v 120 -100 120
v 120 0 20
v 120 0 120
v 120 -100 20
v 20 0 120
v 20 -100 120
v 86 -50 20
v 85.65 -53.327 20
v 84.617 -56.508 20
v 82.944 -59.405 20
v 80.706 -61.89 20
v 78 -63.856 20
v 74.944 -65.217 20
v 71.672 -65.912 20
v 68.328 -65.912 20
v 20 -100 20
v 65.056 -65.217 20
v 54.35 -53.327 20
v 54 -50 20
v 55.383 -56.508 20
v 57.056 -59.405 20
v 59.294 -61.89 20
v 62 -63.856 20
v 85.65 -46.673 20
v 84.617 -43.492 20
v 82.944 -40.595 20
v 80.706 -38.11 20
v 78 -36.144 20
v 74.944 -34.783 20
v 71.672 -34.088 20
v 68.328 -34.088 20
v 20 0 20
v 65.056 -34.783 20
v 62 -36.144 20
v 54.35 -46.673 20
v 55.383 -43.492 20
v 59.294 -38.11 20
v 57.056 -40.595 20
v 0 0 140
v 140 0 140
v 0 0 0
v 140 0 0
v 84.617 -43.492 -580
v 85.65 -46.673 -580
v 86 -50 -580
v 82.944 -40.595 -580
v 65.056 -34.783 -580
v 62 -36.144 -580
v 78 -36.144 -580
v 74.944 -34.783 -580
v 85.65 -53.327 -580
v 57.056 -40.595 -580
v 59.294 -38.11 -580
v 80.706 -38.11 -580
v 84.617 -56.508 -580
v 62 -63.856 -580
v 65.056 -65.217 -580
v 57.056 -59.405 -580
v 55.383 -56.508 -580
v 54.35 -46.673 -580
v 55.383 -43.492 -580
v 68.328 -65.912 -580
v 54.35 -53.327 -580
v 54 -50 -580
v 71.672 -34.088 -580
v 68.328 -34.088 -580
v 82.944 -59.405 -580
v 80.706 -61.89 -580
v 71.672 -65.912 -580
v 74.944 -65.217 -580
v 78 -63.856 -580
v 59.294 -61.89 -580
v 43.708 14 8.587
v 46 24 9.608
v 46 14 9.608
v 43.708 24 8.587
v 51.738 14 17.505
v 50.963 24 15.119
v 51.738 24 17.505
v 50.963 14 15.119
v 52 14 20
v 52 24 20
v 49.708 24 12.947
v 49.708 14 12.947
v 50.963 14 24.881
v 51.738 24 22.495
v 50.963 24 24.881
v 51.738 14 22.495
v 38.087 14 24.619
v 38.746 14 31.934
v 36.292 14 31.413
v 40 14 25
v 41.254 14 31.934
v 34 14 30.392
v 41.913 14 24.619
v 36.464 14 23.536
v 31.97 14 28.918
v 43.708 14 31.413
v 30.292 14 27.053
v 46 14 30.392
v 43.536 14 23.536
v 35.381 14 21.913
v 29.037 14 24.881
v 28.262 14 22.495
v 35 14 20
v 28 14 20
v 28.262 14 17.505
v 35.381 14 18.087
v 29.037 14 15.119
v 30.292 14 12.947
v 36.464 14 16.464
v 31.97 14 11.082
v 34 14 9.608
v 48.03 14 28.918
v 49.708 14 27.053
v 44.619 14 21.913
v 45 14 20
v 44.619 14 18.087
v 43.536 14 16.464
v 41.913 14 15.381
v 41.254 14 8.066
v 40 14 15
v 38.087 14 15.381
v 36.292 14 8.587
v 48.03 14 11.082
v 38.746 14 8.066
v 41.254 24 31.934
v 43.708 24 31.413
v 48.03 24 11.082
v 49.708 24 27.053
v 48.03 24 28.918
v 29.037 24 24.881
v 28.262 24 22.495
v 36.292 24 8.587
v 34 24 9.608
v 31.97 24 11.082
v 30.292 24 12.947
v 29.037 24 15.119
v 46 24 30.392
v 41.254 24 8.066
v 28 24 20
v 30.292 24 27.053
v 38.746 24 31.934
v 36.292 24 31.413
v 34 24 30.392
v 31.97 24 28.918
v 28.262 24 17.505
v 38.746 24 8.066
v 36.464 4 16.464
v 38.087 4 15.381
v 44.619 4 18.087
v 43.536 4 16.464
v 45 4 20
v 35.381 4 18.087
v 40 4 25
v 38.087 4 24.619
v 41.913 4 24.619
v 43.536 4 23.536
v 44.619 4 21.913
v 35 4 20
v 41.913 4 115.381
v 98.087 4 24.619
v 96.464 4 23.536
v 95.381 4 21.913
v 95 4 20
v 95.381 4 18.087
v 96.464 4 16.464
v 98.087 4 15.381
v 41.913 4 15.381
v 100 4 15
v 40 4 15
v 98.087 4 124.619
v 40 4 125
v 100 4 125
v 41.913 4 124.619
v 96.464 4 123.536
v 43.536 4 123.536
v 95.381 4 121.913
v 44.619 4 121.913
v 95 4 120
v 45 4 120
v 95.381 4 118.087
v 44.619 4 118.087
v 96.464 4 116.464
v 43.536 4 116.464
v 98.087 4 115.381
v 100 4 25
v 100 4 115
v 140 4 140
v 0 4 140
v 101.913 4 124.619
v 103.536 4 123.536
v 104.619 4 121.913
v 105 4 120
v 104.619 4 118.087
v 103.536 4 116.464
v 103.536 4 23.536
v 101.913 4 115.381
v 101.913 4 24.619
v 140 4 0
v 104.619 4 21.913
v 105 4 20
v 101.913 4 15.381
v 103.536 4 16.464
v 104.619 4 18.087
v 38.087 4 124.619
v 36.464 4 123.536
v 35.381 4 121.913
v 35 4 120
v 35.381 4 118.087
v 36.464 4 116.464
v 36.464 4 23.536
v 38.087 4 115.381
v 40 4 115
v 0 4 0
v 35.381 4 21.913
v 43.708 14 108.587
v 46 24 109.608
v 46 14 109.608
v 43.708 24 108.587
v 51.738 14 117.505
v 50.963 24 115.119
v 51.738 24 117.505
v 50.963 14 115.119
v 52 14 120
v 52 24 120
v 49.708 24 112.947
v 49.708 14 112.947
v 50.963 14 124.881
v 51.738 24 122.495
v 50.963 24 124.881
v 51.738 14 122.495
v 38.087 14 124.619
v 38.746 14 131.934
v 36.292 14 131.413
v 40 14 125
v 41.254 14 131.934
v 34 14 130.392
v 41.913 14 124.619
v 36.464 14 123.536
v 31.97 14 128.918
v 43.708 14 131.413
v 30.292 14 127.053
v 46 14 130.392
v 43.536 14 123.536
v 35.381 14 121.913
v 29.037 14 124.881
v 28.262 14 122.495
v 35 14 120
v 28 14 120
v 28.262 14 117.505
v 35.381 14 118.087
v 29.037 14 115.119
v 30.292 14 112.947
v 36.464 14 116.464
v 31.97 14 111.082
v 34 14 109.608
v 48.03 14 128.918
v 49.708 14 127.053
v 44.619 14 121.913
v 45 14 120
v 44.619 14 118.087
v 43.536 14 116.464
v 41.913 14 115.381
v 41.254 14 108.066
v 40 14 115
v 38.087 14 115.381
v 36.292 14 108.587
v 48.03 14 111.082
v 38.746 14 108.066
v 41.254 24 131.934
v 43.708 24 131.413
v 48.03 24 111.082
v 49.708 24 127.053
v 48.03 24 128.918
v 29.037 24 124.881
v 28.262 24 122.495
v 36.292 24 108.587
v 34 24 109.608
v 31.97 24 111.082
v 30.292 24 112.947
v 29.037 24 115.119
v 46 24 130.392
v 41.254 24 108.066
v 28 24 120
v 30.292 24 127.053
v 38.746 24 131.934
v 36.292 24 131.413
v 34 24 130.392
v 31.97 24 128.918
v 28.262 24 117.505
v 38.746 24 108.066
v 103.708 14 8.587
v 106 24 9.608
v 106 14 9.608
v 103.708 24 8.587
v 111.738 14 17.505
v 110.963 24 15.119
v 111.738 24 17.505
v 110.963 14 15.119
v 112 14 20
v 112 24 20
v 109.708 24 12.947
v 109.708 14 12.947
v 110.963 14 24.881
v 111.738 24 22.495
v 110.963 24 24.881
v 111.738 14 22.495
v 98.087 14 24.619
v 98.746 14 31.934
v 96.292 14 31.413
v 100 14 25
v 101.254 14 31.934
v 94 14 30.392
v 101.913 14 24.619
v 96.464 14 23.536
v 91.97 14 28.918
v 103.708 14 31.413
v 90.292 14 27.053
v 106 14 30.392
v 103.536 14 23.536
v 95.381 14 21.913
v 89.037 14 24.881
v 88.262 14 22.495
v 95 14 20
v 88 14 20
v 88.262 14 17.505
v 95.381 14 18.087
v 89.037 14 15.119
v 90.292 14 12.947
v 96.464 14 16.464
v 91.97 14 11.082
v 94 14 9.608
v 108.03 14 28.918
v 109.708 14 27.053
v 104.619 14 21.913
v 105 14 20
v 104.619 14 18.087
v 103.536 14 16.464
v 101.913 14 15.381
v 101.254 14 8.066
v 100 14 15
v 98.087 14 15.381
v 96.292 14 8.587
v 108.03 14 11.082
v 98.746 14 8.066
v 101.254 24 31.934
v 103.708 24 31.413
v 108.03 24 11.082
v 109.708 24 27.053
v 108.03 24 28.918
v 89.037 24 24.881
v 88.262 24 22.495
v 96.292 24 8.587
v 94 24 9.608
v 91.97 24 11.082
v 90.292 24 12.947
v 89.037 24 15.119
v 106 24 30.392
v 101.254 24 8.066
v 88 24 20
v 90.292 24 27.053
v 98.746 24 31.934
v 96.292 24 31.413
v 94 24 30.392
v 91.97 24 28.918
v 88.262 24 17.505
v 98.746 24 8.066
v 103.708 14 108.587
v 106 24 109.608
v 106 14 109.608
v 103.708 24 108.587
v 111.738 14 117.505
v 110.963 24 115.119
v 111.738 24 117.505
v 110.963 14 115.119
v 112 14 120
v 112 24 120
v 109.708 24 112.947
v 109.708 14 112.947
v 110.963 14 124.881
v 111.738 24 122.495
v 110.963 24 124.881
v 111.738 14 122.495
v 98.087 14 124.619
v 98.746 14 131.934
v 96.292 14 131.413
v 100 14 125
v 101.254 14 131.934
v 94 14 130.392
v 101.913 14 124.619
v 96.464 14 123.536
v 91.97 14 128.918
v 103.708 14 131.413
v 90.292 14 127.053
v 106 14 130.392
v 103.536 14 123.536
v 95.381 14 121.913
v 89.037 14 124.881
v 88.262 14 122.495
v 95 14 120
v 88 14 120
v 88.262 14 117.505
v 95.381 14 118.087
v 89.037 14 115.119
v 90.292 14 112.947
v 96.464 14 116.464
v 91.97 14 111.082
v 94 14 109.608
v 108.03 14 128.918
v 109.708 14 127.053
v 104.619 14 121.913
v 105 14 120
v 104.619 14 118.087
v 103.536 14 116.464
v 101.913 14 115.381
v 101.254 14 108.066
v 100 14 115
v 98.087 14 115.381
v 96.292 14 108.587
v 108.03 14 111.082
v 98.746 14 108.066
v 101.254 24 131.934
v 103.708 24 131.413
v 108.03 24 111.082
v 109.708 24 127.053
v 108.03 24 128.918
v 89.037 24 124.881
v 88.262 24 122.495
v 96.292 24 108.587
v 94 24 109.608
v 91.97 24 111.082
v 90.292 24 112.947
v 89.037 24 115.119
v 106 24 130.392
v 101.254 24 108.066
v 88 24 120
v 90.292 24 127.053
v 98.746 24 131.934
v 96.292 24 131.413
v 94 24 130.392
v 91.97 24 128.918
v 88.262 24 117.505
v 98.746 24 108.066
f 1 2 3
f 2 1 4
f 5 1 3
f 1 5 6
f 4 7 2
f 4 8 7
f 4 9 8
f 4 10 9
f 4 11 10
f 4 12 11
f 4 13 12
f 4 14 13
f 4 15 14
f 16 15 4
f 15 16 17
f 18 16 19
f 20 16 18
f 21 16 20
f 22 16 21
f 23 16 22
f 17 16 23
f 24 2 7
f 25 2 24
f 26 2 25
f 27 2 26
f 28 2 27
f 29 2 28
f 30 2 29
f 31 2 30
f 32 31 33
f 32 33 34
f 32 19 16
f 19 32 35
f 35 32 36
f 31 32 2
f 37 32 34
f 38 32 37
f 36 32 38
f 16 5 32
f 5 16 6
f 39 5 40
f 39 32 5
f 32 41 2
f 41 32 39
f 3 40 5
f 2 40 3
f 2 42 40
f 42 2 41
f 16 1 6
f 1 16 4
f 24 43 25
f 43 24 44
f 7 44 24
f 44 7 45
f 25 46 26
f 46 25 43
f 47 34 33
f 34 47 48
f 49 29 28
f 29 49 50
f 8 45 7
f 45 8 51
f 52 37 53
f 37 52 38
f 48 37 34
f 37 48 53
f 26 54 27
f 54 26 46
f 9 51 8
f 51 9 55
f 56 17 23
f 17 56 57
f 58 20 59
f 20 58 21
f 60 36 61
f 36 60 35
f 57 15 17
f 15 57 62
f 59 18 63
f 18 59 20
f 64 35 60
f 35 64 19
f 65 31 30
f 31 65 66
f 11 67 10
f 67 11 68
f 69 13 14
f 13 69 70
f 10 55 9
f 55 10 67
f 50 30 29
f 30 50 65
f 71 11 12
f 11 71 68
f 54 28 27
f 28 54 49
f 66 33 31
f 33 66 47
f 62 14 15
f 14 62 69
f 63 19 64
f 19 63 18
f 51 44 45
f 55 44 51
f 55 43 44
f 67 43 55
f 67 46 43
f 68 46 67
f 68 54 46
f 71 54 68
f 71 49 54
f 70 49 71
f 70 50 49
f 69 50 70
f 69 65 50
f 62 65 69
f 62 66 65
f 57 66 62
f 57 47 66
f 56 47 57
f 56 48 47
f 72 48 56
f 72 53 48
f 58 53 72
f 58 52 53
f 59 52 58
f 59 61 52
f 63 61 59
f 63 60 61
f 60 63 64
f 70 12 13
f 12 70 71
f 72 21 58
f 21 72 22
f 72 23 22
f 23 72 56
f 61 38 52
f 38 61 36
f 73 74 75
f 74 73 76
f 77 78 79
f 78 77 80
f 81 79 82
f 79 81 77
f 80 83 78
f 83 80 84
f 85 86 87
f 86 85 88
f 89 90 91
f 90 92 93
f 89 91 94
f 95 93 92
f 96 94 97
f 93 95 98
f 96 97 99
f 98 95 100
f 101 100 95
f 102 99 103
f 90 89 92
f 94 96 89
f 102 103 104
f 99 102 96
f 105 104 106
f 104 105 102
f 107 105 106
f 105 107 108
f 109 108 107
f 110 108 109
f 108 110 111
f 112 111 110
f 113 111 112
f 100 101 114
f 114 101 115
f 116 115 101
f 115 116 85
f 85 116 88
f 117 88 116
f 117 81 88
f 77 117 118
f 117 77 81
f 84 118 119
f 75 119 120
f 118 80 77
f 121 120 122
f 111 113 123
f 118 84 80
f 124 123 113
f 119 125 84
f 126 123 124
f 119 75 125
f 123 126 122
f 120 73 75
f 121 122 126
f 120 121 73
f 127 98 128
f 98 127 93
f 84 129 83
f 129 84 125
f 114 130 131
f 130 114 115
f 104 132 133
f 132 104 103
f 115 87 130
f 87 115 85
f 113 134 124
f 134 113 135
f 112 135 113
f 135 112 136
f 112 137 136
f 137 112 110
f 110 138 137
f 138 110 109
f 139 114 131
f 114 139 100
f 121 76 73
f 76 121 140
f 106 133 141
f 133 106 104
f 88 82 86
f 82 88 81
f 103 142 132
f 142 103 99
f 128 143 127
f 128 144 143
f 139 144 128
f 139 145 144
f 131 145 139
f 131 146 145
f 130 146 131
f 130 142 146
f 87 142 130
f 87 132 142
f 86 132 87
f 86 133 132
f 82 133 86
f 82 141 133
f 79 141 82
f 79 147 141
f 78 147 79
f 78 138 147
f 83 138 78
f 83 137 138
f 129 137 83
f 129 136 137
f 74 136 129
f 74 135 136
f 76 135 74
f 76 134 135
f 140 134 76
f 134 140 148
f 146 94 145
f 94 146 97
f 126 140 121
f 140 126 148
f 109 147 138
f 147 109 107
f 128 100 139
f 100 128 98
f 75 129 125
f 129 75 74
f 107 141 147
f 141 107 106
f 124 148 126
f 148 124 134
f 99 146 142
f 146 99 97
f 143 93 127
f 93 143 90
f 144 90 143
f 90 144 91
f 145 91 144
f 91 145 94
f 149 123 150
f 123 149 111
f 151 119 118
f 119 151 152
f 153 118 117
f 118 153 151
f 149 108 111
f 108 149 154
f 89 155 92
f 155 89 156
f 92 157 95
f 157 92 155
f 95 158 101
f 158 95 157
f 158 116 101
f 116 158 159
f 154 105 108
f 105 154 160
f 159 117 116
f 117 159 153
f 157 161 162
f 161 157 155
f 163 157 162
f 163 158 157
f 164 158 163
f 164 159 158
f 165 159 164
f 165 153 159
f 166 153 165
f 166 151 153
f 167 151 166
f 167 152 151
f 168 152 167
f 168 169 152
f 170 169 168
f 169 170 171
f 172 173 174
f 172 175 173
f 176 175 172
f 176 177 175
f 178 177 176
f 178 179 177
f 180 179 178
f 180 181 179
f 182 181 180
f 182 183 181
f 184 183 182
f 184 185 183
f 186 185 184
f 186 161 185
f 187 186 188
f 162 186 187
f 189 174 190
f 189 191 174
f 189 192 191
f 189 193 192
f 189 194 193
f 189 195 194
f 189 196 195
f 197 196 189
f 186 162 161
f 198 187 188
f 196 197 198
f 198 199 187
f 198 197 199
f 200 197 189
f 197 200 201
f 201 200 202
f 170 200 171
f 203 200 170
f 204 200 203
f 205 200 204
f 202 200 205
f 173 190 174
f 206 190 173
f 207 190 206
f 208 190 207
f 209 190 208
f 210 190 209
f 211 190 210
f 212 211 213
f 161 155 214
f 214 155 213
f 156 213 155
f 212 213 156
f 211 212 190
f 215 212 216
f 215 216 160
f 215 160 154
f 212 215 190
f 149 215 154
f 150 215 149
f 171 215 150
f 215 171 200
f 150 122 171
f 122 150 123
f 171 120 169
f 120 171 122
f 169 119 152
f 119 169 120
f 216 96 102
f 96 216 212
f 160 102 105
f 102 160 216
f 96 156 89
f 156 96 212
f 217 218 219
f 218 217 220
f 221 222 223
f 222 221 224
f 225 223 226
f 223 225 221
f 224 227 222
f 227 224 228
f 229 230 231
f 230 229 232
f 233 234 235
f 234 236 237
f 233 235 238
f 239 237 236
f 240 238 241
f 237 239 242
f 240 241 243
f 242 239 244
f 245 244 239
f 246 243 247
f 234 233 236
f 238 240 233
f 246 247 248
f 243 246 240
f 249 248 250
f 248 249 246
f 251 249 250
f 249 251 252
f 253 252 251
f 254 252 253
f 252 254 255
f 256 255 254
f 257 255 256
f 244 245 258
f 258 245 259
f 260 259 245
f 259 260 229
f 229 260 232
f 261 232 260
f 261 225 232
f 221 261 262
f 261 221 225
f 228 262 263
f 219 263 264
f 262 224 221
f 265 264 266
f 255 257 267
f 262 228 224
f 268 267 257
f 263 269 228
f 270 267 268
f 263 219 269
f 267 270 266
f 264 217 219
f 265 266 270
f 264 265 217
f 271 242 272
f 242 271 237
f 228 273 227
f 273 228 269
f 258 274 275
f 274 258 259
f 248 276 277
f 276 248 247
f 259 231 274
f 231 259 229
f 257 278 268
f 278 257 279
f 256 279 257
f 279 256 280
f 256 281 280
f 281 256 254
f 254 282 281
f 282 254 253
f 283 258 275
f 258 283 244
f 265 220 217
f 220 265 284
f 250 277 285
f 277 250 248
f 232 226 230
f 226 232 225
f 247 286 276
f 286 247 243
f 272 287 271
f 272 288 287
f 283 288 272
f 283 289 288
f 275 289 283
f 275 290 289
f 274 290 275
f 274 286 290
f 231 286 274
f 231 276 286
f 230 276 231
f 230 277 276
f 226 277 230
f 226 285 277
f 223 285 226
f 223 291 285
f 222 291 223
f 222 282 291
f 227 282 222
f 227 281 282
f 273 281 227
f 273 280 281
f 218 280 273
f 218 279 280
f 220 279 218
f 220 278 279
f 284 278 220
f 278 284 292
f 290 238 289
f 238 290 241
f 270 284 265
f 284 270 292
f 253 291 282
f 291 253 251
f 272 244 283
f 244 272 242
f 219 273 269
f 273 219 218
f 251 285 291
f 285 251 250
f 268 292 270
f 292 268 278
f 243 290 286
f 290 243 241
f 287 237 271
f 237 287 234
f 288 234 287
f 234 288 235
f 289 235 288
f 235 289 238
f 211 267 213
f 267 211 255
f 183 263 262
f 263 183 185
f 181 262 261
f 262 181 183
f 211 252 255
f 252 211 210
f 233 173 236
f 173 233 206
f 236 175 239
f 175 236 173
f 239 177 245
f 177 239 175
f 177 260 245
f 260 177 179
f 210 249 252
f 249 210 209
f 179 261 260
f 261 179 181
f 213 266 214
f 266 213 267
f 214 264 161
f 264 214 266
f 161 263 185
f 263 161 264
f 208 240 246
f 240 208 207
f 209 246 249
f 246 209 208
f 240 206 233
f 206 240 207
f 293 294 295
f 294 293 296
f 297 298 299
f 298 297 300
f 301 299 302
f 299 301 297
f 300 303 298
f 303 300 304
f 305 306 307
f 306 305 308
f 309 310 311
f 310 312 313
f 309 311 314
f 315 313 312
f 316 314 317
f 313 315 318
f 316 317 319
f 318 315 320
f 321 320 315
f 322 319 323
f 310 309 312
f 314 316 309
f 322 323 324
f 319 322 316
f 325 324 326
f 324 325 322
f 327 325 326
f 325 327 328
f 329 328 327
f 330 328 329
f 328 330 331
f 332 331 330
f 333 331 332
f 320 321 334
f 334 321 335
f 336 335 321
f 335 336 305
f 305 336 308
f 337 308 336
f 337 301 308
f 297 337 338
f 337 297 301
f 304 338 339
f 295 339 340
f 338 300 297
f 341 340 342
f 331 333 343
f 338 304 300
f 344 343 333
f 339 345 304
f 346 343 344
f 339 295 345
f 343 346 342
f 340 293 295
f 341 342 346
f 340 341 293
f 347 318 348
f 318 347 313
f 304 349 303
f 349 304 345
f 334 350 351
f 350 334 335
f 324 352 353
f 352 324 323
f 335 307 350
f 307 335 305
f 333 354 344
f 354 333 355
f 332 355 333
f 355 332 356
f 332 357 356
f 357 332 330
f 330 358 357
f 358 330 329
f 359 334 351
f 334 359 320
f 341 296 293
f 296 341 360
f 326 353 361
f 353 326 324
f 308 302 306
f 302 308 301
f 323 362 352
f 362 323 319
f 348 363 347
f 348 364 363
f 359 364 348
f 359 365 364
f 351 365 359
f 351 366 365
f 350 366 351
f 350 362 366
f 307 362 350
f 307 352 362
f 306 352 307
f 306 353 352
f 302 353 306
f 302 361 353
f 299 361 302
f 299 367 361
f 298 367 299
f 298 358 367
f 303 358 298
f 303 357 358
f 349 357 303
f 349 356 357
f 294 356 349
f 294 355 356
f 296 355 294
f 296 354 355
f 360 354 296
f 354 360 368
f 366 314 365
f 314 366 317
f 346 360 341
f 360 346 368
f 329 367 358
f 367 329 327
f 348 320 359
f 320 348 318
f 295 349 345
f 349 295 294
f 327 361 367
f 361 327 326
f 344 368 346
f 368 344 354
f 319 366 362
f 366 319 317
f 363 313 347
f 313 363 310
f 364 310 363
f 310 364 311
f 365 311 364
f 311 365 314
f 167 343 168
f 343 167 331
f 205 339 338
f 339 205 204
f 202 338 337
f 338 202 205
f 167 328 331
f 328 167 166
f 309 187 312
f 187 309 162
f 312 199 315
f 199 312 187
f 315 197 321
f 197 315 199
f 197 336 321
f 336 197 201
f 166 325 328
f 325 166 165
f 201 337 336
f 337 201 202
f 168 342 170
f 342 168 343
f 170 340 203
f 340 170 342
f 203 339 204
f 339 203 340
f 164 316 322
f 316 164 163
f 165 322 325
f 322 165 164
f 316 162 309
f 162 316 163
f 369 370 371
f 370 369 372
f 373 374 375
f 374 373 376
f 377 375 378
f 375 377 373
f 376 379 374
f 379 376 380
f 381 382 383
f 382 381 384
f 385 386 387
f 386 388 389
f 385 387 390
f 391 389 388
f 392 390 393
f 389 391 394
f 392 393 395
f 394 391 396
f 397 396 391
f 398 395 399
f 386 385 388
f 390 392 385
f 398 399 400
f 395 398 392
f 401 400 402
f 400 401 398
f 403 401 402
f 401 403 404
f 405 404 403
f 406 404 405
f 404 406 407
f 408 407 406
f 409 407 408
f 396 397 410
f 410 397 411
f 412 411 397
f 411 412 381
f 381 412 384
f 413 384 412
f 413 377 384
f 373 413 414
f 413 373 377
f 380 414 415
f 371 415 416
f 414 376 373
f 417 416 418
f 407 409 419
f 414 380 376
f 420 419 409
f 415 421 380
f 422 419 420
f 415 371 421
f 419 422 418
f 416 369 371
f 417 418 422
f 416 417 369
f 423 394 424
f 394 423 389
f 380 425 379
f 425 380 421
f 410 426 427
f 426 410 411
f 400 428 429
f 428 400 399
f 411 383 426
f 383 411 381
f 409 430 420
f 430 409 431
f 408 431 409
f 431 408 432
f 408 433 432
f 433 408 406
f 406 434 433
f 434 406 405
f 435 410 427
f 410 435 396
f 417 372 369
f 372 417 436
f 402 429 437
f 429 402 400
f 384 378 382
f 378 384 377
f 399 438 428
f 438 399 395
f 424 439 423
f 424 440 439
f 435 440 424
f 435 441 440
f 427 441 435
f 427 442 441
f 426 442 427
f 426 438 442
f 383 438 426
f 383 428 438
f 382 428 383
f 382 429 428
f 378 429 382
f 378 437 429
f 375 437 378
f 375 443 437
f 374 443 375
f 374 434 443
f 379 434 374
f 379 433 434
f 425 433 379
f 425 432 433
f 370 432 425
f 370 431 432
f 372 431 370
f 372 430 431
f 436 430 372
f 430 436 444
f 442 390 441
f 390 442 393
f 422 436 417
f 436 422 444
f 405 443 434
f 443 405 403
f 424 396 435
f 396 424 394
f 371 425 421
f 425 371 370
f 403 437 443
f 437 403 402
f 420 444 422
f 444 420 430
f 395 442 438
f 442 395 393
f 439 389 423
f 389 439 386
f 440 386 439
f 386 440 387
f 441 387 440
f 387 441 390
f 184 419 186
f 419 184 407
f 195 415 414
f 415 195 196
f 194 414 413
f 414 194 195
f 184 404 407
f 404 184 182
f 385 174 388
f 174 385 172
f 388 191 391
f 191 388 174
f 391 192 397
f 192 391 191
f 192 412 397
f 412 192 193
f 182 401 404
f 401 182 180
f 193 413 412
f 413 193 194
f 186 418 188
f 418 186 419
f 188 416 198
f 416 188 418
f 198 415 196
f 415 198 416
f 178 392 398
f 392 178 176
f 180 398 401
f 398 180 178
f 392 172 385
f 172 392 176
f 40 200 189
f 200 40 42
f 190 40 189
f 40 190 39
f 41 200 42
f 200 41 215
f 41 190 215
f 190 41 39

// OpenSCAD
// file: xcarve-vwheel.scad
module vwheel(spacer)
{
        color("grey") {
                translate([0, 0, 10]) cylinder(r=12, h=10);
                cylinder(r=5, h=spacer);
        }
}
// main file
use <xcarve-vwheel.scad>

module weedingtool(length)
{
        color("yellow") {
                translate([-50, -100, -50])
                cube([100, 100, 100]);
        }
        color("grey") {
                translate([0, -50, -length-50])
                cylinder(r=16, h=length);
        }
}

module z_carriage(height, tool_length, invert)
{
        translate([70, 0, 70]) 
                rotate([0, invert? 180 : 0, 0])
                weedingtool(tool_length);
        color("black") {
                cube([140, 4, 140]);
        }
        translate([40, 4, 20]) 
                rotate([-90, 0, 0])
                vwheel(10);
        translate([40, 4, 120]) 
                rotate([-90, 0, 0])
                vwheel(10);
        translate([140-40, 4, 20]) 
                rotate([-90, 0, 0])
                vwheel(10);
        translate([140-40, 4, 120]) 
                rotate([-90, 0, 0])
                vwheel(10);
}

z_carriage(600, 600);
